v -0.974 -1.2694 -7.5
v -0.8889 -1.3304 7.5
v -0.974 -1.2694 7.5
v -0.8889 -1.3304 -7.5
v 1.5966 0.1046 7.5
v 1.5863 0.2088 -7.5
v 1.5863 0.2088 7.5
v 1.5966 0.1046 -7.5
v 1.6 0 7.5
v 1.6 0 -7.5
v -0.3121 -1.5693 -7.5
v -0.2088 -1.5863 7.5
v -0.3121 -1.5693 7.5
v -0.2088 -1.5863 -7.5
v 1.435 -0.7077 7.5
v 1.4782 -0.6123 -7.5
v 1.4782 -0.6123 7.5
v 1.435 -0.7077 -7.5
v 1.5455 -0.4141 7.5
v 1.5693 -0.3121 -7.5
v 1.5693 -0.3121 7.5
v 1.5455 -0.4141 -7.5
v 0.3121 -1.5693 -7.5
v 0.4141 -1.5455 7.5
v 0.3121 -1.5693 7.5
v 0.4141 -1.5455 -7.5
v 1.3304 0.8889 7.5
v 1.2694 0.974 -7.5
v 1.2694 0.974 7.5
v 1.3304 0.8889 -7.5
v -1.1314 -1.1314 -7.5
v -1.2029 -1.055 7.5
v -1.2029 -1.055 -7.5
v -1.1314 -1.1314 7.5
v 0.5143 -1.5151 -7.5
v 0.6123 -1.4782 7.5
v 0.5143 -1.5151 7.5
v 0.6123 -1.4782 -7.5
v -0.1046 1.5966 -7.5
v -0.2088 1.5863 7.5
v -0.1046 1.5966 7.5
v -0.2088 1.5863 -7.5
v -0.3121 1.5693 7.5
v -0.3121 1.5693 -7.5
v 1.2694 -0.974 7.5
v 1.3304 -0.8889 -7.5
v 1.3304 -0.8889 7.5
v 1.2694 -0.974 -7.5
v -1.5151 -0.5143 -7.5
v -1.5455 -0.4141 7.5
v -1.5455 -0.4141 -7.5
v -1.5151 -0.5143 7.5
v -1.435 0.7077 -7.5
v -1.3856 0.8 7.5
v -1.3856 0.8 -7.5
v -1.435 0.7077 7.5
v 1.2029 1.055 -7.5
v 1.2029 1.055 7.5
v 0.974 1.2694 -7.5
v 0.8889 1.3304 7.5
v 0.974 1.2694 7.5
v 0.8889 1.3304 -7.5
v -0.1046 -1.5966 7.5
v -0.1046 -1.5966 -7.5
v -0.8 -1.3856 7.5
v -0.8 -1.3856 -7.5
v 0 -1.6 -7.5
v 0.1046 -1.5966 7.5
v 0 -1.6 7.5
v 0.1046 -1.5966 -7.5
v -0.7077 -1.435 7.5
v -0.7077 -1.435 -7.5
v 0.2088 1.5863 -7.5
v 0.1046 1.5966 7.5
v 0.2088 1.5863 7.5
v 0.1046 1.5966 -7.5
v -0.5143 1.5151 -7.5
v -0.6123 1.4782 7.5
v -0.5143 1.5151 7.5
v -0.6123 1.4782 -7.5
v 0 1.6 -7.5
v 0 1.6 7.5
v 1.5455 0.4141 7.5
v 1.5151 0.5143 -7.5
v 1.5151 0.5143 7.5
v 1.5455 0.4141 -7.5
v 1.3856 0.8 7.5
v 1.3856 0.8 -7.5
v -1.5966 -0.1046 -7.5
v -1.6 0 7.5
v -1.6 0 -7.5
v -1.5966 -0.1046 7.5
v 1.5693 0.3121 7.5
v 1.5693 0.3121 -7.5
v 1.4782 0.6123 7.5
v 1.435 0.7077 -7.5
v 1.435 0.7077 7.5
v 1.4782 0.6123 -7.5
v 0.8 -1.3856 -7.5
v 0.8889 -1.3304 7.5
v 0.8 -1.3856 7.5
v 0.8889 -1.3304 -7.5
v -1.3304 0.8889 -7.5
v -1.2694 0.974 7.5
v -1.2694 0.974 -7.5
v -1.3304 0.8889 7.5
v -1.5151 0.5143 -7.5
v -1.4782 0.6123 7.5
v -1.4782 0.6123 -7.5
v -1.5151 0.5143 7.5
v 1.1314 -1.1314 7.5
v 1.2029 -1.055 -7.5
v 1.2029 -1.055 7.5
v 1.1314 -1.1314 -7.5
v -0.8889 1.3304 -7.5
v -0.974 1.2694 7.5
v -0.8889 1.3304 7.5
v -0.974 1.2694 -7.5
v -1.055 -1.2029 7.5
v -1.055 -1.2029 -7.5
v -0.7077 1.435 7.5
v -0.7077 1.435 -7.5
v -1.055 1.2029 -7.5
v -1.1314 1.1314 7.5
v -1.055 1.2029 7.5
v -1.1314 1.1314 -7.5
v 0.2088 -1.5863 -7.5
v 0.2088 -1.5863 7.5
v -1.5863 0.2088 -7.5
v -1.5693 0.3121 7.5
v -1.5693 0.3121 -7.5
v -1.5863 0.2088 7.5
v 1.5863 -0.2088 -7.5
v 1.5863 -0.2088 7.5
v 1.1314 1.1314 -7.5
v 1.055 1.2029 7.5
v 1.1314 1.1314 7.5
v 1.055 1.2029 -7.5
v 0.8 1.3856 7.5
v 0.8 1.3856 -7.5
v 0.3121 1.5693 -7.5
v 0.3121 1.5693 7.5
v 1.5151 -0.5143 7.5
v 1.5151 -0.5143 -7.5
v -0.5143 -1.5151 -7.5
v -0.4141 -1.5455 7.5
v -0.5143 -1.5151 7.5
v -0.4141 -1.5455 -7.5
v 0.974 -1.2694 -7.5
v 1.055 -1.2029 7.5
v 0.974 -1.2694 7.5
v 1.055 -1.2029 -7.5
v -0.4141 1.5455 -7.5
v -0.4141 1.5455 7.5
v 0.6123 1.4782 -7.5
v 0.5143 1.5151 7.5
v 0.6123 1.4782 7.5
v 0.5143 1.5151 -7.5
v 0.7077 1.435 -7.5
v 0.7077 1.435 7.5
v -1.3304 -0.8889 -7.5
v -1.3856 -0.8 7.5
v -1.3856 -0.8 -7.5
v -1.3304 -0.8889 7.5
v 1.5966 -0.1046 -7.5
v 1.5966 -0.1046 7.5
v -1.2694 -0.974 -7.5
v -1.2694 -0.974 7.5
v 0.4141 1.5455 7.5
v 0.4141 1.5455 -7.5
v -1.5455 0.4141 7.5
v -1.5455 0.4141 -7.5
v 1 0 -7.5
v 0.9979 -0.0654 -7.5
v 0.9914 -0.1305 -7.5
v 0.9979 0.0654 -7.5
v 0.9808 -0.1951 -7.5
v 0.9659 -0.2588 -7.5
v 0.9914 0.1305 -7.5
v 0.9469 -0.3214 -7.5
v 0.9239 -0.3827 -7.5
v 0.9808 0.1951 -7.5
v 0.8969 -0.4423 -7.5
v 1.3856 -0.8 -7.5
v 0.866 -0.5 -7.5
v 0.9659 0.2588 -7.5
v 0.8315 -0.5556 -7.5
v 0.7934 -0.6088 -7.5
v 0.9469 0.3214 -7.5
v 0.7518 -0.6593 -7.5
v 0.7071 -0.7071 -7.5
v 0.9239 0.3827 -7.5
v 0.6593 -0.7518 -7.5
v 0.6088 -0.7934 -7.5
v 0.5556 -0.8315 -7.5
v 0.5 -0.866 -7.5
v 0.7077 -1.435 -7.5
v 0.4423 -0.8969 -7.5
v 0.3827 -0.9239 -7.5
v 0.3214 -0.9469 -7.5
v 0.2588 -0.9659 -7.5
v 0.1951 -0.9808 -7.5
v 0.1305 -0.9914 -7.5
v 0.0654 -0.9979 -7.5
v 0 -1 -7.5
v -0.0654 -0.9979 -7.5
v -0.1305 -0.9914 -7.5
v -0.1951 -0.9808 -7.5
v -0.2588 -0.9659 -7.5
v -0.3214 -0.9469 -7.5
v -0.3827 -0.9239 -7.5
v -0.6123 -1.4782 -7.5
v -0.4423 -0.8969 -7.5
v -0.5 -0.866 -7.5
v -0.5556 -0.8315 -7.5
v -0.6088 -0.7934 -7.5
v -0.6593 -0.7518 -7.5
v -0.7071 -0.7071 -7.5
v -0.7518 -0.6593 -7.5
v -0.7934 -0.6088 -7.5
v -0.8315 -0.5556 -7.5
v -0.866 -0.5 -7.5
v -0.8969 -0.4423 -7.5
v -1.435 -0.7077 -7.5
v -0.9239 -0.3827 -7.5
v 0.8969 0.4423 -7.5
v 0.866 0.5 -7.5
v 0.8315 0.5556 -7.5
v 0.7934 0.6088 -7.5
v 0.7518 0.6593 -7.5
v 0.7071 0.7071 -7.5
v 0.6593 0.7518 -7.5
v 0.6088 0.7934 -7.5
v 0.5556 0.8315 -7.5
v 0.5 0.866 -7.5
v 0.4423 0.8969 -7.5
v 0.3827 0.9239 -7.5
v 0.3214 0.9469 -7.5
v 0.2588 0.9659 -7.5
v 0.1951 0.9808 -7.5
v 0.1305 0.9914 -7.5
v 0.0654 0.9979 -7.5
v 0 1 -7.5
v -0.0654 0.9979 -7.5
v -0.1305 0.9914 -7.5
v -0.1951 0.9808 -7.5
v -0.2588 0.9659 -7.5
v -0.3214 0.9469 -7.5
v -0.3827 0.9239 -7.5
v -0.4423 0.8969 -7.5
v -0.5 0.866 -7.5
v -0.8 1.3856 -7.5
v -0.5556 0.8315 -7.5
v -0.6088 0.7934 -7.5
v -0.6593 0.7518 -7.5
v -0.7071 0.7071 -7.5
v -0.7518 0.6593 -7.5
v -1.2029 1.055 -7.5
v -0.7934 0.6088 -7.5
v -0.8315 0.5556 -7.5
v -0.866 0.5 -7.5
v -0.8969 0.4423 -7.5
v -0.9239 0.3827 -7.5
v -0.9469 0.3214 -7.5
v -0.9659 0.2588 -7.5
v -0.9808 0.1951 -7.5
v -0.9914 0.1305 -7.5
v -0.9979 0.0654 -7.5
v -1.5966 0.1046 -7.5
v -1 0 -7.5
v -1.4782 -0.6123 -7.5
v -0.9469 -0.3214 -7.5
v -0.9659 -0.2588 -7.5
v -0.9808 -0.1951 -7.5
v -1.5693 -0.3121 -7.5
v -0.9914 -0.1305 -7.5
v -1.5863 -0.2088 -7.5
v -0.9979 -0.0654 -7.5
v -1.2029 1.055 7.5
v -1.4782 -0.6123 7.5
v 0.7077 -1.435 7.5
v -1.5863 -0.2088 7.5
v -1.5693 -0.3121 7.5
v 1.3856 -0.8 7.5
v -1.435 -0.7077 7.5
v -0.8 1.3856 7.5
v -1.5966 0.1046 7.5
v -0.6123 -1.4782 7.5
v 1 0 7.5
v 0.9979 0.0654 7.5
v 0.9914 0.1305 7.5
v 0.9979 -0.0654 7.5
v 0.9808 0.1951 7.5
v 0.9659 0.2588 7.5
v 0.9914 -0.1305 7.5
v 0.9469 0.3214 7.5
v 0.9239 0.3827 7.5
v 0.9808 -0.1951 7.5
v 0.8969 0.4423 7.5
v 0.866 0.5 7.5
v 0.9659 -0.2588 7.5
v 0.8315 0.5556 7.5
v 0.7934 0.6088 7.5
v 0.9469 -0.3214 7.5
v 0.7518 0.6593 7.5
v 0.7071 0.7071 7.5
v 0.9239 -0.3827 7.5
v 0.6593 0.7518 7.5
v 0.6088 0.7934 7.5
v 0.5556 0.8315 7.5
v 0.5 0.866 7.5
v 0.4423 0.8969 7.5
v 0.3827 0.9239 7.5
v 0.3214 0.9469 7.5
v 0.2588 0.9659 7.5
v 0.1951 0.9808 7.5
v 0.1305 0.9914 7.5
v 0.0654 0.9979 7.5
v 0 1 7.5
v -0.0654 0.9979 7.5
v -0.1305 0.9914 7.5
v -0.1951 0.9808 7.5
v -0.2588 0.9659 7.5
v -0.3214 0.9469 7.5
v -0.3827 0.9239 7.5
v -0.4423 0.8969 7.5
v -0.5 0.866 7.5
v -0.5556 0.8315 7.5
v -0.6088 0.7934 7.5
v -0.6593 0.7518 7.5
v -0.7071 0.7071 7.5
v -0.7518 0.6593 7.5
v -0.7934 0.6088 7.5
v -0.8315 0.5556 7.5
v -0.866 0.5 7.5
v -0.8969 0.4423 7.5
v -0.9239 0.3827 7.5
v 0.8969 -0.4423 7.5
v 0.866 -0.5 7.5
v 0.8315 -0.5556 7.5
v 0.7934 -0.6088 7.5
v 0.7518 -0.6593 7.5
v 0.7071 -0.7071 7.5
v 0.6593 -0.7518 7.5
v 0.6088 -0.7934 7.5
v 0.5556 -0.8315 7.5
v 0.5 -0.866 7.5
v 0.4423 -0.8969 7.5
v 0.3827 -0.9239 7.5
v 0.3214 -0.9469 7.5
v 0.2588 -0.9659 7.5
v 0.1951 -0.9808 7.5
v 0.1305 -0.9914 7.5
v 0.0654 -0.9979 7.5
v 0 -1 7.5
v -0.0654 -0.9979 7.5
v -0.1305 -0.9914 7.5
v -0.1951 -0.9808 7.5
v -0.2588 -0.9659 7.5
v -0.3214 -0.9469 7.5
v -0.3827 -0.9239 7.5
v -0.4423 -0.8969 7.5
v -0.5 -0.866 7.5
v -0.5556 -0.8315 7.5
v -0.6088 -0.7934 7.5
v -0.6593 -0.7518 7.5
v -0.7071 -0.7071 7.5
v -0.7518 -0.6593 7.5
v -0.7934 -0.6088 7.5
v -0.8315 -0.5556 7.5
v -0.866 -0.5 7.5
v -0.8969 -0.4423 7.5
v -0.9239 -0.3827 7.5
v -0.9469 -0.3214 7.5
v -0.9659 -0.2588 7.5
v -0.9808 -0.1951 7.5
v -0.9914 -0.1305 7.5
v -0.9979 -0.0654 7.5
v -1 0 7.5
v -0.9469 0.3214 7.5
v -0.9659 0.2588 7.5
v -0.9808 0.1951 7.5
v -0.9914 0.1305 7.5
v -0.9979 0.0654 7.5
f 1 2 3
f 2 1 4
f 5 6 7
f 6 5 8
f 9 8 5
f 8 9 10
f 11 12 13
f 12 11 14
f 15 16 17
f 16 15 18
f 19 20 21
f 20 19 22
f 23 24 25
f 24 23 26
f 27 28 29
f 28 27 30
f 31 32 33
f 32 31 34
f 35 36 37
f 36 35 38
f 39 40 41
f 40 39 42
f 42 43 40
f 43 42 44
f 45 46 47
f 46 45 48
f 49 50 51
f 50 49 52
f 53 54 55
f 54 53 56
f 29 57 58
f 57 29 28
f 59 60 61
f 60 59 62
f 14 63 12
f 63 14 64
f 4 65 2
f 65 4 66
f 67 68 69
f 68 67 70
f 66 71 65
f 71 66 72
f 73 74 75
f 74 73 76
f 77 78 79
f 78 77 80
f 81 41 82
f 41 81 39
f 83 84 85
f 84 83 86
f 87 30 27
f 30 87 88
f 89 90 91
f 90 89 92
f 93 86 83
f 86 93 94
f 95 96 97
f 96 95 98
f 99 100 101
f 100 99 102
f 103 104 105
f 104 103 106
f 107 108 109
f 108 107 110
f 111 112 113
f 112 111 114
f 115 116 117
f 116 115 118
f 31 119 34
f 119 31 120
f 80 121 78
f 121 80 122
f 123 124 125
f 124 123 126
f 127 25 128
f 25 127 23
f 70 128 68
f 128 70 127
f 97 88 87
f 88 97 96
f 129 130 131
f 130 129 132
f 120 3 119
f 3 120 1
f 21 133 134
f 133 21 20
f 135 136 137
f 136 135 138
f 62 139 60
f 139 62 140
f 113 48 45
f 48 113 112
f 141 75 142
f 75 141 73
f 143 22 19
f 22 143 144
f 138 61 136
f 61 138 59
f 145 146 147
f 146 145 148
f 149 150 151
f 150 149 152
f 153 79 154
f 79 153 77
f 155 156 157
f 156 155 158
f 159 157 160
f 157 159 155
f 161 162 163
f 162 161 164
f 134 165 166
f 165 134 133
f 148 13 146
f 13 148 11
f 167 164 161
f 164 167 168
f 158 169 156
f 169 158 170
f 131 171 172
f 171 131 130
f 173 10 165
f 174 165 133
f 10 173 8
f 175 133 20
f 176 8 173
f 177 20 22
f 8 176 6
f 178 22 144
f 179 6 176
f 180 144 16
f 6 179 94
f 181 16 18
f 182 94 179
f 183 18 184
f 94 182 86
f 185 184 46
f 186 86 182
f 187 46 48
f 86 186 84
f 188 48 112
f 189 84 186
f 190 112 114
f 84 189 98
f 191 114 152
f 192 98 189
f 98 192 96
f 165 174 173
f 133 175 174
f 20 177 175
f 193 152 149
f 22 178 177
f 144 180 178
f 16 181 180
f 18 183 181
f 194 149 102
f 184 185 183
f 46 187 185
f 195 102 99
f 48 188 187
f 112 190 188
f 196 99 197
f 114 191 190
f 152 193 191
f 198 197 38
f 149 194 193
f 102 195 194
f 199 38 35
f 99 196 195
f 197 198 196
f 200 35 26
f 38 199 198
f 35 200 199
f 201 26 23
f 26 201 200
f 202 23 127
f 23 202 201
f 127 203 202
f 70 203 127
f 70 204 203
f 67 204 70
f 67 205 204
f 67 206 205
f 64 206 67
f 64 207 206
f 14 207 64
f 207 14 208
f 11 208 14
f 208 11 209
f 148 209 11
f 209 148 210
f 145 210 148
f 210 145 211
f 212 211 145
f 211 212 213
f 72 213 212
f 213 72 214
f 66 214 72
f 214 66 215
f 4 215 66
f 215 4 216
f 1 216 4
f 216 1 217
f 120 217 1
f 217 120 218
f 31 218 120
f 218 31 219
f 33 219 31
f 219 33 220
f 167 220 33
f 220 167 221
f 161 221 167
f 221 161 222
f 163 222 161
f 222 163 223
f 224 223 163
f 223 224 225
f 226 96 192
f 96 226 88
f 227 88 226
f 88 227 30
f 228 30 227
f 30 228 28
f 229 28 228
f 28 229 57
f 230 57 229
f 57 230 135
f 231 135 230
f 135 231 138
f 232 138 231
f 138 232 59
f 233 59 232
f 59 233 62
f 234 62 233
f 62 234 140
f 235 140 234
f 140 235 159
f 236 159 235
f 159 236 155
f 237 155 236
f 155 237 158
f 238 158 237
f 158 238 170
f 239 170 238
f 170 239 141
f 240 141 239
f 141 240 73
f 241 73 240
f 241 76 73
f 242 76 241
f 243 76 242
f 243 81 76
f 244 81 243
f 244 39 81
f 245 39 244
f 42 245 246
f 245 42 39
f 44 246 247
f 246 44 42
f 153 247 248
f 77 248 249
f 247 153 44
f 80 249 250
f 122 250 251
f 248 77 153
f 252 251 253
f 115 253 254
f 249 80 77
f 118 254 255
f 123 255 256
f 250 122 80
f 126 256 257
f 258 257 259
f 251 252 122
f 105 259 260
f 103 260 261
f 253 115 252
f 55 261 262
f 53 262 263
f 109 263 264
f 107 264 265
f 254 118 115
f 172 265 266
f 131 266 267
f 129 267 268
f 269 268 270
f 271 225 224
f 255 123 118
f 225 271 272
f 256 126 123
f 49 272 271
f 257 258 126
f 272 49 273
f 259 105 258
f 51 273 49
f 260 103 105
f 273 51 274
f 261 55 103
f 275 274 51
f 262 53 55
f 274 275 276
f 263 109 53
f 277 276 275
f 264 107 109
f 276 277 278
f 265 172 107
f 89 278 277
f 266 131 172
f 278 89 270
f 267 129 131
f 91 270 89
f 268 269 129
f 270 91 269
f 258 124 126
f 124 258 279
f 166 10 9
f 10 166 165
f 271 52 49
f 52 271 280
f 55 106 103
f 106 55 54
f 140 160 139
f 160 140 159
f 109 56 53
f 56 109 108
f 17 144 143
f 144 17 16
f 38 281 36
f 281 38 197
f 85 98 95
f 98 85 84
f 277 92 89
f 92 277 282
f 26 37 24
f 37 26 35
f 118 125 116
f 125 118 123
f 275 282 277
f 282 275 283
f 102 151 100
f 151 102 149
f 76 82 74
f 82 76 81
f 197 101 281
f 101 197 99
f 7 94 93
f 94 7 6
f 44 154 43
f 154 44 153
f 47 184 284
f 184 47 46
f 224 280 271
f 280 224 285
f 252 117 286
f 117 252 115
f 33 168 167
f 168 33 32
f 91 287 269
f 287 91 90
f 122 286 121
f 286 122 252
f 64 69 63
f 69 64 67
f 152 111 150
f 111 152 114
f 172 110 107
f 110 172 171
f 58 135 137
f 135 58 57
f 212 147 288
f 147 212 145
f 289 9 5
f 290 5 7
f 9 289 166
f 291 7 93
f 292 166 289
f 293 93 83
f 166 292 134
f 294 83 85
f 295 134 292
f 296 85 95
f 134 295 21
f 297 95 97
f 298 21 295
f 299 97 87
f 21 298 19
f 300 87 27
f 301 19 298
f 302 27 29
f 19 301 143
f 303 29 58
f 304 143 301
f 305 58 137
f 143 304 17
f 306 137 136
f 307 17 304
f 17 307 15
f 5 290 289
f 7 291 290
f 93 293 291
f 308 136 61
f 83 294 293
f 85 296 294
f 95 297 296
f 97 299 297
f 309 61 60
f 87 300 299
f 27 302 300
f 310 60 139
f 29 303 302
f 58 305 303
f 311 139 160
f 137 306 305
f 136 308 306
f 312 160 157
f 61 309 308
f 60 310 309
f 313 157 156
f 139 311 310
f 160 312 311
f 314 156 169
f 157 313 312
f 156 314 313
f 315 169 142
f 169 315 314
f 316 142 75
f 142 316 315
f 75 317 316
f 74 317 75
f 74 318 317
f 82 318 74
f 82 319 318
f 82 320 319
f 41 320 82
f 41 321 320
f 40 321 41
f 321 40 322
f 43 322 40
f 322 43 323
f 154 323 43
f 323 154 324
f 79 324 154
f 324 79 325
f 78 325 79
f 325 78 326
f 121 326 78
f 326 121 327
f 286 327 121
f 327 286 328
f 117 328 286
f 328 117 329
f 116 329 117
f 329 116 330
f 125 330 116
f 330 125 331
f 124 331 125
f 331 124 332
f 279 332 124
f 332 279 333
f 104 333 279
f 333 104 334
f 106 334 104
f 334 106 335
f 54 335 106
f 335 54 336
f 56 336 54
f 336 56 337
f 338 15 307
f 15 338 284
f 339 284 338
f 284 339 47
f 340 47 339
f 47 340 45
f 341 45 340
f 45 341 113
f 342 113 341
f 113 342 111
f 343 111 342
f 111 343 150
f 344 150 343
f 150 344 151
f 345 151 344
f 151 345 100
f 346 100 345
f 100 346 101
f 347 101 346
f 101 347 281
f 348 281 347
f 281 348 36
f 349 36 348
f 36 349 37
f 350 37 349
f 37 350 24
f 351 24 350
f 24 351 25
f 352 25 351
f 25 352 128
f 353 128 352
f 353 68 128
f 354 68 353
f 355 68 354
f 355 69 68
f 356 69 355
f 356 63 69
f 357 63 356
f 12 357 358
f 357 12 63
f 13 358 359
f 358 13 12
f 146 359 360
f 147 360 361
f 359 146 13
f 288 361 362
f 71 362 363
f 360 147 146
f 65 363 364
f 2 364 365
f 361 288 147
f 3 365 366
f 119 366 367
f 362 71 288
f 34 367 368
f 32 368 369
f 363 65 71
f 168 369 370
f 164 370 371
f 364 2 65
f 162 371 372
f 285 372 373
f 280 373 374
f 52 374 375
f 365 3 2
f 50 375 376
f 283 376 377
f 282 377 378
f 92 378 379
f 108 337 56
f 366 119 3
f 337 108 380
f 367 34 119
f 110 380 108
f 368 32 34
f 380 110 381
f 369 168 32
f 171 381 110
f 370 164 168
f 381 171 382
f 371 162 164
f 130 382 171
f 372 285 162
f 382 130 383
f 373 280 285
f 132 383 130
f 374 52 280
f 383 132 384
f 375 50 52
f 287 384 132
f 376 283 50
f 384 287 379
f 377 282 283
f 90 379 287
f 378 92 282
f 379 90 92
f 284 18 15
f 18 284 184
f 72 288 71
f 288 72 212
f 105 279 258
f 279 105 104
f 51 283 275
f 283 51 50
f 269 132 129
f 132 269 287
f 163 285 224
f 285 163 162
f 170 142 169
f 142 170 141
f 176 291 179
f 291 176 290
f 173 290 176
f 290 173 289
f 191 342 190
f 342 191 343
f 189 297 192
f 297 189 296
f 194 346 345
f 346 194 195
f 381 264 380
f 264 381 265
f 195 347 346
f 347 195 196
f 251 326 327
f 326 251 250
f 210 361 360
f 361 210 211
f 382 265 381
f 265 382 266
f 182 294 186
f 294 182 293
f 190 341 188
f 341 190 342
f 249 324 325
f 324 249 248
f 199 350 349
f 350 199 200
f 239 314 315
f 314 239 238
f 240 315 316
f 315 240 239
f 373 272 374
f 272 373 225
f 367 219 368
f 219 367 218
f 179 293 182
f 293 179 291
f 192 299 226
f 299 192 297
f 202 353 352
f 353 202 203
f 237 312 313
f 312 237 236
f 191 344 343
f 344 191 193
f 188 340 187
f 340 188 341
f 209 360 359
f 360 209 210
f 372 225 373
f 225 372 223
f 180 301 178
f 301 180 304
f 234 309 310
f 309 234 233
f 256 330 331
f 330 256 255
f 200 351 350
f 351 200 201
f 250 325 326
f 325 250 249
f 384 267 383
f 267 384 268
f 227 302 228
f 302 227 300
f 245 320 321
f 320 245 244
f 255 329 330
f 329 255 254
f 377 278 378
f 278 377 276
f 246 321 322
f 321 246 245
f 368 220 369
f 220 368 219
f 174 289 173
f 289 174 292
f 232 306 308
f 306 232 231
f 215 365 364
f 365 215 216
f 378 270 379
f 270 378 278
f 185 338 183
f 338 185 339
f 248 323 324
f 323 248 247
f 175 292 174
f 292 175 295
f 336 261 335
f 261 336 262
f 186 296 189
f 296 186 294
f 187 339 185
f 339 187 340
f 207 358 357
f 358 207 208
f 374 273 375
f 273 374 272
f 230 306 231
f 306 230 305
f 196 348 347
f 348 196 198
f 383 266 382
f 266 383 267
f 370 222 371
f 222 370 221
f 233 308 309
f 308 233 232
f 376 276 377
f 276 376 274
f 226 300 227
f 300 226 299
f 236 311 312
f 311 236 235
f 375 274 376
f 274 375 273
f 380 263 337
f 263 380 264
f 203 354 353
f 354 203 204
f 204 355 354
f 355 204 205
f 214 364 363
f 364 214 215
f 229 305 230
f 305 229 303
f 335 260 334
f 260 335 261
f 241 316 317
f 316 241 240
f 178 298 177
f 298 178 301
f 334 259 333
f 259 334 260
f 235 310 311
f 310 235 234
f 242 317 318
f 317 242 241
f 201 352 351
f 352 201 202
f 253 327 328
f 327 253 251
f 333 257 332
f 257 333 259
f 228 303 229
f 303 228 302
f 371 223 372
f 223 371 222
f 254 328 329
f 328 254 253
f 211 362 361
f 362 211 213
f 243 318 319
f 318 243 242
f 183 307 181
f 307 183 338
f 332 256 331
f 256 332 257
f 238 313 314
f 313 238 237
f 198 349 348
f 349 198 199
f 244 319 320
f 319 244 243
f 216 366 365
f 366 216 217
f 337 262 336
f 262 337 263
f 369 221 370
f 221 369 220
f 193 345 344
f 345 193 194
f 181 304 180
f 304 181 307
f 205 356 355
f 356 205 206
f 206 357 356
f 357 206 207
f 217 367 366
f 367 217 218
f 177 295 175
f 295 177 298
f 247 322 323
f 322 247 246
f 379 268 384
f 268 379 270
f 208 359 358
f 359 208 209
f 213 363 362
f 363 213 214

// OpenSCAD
// Heatshrink sleeving tubing (single connected solid)

// Parameters
type = 1; //[1:5:1]
length = 15; //[8:40:1]
forced_id = 0; //[0:10:1]
center = 1; //[0:1:1]
path_enabled = 0; //[0:1:1]
nominal_id = 2.0; //[1.0:6.0:0.1]
nominal_od = 3.2; //[1.6:12.0:0.1]
eps_overlap = 0.8; //[0.5:2.0:0.1]
tube_id = 2.0; //[1.0:6.0:0.1]
tube_od = 3.2; //[1.6:12.0:0.1]

// Derived / safety
$fn = 96;
eps = 0.02;

// Use forced_id if provided (>0), else tube_id
id = (forced_id > 0) ? forced_id : tube_id;
od = tube_od;

// Ensure valid wall thickness
id_safe = min(id, od - 2*eps);
od_safe = max(od, id_safe + 2*eps);

// Heatshrink tube: hollow cylinder segment (one connected solid)
module heatshrink_tube(len, id_d, od_d, centered=true) {
  difference() {
    cylinder(d=od_d, h=len, center=centered);
    // Inner void slightly longer to guarantee clean subtraction
    cylinder(d=id_d, h=len + 2*eps_overlap, center=centered);
  }
}

// Placement: if center==1 -> centered at origin; if center==0 -> base at z=0
zpos = (center == 1) ? 0 : length/2;

translate([0, 0, zpos])
  heatshrink_tube(length, id_safe, od_safe, centered=true);
